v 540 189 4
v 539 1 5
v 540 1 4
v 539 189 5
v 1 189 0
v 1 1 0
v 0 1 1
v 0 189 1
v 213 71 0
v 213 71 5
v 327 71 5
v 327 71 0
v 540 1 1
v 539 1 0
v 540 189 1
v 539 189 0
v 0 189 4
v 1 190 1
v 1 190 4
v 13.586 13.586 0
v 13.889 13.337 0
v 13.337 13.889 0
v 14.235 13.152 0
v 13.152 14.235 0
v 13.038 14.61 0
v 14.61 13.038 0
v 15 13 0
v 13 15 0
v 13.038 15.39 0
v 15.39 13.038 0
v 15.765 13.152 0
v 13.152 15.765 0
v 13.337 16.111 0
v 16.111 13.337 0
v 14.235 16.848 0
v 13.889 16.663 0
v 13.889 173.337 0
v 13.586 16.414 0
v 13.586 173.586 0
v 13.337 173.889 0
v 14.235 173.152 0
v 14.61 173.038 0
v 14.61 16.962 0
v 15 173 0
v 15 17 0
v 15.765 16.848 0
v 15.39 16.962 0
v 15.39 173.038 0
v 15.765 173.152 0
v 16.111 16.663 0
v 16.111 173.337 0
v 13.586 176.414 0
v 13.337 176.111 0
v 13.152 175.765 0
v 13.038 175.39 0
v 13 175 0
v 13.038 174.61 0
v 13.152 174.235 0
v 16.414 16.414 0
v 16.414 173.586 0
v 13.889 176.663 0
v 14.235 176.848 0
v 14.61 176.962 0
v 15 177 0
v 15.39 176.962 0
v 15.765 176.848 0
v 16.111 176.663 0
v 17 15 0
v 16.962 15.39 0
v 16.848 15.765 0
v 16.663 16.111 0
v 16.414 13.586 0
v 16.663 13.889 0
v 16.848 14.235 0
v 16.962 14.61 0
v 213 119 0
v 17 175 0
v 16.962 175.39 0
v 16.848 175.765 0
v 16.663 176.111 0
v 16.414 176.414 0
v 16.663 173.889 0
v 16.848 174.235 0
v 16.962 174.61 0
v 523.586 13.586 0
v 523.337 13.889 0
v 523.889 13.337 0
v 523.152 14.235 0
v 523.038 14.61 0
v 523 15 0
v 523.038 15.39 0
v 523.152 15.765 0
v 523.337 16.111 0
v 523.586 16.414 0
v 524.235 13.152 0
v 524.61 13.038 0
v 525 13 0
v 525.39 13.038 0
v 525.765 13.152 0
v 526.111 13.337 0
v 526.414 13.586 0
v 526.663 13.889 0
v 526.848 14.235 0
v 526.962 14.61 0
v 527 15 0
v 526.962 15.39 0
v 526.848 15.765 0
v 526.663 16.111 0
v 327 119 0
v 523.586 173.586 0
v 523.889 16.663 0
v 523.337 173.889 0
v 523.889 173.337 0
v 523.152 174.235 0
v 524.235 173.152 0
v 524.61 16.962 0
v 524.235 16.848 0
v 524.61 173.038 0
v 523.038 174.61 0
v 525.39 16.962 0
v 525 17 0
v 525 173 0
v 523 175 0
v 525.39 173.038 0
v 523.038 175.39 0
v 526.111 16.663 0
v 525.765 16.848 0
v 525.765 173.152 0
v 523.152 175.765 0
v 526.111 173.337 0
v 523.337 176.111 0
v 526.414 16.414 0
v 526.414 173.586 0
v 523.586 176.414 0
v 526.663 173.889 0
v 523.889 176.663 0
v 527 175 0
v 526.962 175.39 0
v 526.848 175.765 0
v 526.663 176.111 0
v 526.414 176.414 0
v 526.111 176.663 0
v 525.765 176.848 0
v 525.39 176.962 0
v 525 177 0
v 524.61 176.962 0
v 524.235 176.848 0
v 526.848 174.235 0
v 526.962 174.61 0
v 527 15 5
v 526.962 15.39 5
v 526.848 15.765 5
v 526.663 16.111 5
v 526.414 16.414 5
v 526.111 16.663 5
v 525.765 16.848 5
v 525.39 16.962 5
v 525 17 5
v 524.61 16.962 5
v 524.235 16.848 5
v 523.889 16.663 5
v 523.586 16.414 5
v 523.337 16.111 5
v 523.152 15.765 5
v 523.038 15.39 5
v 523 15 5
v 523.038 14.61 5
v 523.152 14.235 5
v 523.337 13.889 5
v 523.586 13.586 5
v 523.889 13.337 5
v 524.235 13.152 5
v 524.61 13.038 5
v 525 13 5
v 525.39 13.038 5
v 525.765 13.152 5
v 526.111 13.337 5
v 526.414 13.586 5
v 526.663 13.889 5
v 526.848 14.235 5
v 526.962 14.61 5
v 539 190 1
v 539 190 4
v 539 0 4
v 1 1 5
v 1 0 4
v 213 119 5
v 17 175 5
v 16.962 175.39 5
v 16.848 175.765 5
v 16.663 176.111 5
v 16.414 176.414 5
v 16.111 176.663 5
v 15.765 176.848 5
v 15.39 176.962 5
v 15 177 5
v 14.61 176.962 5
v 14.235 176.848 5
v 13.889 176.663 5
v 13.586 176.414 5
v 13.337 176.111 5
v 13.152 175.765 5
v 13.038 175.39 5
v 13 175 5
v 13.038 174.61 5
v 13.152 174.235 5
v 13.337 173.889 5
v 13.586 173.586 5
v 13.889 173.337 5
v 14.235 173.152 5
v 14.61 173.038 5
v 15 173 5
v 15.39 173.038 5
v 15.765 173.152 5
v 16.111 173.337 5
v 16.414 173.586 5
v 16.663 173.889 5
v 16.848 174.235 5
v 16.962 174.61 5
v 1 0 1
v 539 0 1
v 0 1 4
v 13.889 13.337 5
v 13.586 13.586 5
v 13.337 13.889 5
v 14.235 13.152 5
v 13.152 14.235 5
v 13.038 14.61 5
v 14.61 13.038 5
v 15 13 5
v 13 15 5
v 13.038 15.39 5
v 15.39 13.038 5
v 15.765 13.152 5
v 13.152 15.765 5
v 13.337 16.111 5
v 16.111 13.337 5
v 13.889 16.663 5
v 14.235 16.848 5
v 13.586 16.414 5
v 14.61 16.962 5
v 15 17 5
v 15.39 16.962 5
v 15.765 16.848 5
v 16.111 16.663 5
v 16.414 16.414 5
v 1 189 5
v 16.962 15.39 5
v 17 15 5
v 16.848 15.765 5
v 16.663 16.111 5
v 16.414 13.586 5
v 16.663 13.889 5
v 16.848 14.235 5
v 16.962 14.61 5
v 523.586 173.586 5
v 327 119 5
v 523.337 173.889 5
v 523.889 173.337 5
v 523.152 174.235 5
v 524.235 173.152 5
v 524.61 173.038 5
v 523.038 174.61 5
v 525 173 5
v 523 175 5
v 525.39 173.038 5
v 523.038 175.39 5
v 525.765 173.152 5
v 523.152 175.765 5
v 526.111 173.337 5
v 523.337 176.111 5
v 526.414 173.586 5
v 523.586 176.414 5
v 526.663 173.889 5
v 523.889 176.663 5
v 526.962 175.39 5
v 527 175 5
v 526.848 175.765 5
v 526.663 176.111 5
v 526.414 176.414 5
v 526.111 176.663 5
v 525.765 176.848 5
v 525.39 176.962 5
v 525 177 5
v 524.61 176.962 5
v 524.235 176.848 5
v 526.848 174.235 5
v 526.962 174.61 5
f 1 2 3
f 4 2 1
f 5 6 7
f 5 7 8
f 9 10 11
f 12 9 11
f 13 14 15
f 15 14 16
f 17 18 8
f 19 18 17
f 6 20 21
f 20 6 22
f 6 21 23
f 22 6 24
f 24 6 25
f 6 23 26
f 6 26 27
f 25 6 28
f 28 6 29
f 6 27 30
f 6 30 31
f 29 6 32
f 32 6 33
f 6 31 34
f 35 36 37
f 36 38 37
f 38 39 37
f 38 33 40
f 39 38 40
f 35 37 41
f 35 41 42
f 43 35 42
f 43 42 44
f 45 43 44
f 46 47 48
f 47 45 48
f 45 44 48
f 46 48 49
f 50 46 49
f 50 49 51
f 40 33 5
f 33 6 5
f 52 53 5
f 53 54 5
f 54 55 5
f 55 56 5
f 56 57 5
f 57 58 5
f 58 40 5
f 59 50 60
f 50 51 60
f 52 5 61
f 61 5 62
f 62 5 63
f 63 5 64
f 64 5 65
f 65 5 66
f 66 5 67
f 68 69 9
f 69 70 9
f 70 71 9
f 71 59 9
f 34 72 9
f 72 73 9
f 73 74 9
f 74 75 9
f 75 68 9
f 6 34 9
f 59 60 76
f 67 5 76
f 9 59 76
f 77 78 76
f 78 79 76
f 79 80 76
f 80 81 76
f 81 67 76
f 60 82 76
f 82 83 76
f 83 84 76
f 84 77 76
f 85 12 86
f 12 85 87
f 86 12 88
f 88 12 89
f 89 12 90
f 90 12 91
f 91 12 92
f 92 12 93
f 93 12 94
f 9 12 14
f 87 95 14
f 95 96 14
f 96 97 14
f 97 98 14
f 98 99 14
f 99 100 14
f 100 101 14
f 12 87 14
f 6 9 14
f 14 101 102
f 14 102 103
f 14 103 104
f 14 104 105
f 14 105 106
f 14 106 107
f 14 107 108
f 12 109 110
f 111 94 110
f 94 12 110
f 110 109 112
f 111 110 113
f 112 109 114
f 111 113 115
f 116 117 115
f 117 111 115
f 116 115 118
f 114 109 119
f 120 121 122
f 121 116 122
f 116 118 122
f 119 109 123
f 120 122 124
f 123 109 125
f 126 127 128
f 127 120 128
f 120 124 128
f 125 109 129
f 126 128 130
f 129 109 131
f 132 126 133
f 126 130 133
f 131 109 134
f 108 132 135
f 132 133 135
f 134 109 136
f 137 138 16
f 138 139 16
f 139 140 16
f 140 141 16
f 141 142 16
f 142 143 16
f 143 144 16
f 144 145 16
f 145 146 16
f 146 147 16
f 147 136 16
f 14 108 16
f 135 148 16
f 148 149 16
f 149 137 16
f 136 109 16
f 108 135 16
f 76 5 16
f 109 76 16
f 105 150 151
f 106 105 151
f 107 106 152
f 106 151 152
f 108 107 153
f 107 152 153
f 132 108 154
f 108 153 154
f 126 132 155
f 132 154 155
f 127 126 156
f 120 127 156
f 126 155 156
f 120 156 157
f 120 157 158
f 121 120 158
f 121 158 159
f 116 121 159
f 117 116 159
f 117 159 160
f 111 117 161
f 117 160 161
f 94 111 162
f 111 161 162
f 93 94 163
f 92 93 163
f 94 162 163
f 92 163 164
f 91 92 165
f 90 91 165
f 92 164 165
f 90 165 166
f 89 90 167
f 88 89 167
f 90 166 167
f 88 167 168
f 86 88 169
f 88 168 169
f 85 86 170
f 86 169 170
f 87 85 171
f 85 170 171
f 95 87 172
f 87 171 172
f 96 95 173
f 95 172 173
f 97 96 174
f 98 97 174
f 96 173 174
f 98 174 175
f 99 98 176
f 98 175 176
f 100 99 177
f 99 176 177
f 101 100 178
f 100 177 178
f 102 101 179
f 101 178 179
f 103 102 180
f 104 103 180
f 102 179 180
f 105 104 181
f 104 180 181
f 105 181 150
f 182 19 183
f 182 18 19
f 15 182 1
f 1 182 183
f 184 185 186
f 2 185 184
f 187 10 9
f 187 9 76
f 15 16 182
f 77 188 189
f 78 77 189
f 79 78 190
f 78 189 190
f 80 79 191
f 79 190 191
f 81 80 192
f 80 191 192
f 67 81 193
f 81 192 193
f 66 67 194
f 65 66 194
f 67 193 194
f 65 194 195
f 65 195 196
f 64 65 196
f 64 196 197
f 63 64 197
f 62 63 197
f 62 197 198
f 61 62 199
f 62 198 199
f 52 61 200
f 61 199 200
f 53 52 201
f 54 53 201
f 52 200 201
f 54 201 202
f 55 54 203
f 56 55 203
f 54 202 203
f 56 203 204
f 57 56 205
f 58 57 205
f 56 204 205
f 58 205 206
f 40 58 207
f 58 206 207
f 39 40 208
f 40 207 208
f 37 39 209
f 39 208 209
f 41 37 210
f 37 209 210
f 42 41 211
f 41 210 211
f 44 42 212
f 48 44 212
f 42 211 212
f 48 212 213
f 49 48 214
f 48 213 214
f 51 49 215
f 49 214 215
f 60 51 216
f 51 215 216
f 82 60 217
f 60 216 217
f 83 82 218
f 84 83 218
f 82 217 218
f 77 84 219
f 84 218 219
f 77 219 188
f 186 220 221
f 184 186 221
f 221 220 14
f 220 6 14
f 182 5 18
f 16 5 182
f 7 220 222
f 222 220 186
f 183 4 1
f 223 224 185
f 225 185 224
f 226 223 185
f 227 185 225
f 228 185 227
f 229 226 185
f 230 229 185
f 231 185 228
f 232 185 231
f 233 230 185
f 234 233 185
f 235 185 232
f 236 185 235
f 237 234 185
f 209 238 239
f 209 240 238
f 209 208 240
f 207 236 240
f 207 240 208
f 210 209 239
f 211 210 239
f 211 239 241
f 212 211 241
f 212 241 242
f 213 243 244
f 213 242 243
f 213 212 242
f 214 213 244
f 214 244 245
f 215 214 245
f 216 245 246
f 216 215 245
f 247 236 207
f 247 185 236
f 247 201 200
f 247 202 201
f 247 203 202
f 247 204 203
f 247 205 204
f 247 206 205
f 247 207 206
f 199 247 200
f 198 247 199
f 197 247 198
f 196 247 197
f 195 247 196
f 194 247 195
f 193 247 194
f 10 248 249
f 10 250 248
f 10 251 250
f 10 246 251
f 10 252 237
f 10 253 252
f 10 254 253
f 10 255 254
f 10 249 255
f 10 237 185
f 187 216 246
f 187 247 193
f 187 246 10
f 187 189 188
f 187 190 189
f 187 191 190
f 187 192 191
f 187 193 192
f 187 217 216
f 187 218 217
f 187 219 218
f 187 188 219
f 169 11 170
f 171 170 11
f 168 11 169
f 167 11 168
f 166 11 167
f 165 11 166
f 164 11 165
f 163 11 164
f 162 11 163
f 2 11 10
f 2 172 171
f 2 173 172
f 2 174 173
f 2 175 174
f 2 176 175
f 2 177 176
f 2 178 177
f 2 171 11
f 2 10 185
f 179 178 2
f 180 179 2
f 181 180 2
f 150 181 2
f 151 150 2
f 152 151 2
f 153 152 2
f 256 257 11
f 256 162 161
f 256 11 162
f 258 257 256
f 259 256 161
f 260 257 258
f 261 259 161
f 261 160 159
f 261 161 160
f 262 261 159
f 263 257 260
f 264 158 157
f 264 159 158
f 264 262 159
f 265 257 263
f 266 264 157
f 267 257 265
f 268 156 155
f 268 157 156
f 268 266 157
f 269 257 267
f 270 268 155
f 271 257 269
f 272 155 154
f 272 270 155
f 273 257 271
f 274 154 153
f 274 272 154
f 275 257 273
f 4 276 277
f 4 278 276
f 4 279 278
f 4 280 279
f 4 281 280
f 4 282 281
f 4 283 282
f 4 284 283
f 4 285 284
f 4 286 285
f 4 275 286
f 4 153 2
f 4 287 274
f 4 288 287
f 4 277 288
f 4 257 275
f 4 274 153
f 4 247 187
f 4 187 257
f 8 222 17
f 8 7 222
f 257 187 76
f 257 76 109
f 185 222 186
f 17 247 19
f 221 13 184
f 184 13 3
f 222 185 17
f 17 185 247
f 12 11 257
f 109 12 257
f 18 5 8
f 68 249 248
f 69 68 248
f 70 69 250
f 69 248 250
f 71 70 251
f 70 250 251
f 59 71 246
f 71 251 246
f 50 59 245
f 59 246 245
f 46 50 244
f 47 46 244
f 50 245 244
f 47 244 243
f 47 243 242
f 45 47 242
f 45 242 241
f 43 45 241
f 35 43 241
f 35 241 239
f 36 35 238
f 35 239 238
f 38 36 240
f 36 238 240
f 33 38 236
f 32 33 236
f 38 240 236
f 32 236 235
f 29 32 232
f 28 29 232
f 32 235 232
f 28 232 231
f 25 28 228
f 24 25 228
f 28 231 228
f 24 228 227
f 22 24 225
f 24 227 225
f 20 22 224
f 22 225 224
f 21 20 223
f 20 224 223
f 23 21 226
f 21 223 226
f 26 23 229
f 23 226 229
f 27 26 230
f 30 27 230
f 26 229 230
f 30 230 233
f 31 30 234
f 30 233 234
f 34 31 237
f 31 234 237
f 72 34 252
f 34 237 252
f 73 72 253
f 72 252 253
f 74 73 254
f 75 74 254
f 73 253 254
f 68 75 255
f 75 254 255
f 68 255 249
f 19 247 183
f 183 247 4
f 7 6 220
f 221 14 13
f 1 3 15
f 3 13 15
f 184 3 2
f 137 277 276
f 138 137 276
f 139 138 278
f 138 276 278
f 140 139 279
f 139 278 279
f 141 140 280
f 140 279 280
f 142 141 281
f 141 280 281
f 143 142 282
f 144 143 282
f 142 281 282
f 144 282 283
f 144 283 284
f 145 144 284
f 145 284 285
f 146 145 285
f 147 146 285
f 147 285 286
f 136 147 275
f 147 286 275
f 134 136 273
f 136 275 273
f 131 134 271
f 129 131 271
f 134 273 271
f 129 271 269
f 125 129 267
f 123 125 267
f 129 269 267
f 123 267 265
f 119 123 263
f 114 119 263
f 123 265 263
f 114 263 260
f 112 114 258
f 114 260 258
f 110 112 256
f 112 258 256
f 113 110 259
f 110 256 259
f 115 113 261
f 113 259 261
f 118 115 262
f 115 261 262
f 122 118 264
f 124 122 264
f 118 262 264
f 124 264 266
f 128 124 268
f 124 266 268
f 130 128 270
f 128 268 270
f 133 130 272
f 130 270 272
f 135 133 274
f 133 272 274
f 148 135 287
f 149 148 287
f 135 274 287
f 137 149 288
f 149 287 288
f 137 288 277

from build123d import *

# Parameters (mm, degrees)
SKETCH1_W           = 540
SKETCH1_H           = 190
BOSS_EXTRUDE1_DEPTH = 5
CHAMFER1_SIZE       = 1
SKETCH2_R           = 2
CUT_EXTRUDE1_DEPTH  = 5
SKETCH3_W           = 114
SKETCH3_H           = 48
CUT_EXTRUDE2_DEPTH  = 10


with BuildPart() as part:
    # Sketch1 → Boss-Extrude1 (new body)
    with BuildSketch(Plane.XY):
        with Locations((270, 95)):
            Rectangle(SKETCH1_W, SKETCH1_H)
    extrude(amount=BOSS_EXTRUDE1_DEPTH)

    # Chamfer1
    chamfer1_edges = [part.edges().sort_by_distance(p)[0] for p in [
        (540, 95, 5),
        (270, 190, 5),
        (0, 95, 5),
        (270, 190, 0),
        (540, 95, 0),
        (270, 0, 0),
        (0, 95, 0),
        (0, 190, 2.5),
        (540, 190, 2.5),
        (540, 0, 2.5),
        (0, 0, 2.5),
        (270, 0, 5),
    ]]
    chamfer(chamfer1_edges, length=CHAMFER1_SIZE)

    # Sketch2 → Cut-Extrude1 (cut)
    with BuildSketch(Plane.XY.offset(5)):
        with Locations((525, 175)):
            Circle(SKETCH2_R)
        with Locations((525, 15)):
            Circle(SKETCH2_R)
        with Locations((15, 175)):
            Circle(SKETCH2_R)
        with Locations((15, 15)):
            Circle(SKETCH2_R)
    extrude(amount=-CUT_EXTRUDE1_DEPTH, mode=Mode.SUBTRACT)

    # Sketch3 → Cut-Extrude2 (cut)
    with BuildSketch(Plane.XY.offset(5)):
        with Locations((270, 95)):
            Rectangle(SKETCH3_W, SKETCH3_H)
    extrude(amount=-CUT_EXTRUDE2_DEPTH, mode=Mode.SUBTRACT)


solid = part.part
